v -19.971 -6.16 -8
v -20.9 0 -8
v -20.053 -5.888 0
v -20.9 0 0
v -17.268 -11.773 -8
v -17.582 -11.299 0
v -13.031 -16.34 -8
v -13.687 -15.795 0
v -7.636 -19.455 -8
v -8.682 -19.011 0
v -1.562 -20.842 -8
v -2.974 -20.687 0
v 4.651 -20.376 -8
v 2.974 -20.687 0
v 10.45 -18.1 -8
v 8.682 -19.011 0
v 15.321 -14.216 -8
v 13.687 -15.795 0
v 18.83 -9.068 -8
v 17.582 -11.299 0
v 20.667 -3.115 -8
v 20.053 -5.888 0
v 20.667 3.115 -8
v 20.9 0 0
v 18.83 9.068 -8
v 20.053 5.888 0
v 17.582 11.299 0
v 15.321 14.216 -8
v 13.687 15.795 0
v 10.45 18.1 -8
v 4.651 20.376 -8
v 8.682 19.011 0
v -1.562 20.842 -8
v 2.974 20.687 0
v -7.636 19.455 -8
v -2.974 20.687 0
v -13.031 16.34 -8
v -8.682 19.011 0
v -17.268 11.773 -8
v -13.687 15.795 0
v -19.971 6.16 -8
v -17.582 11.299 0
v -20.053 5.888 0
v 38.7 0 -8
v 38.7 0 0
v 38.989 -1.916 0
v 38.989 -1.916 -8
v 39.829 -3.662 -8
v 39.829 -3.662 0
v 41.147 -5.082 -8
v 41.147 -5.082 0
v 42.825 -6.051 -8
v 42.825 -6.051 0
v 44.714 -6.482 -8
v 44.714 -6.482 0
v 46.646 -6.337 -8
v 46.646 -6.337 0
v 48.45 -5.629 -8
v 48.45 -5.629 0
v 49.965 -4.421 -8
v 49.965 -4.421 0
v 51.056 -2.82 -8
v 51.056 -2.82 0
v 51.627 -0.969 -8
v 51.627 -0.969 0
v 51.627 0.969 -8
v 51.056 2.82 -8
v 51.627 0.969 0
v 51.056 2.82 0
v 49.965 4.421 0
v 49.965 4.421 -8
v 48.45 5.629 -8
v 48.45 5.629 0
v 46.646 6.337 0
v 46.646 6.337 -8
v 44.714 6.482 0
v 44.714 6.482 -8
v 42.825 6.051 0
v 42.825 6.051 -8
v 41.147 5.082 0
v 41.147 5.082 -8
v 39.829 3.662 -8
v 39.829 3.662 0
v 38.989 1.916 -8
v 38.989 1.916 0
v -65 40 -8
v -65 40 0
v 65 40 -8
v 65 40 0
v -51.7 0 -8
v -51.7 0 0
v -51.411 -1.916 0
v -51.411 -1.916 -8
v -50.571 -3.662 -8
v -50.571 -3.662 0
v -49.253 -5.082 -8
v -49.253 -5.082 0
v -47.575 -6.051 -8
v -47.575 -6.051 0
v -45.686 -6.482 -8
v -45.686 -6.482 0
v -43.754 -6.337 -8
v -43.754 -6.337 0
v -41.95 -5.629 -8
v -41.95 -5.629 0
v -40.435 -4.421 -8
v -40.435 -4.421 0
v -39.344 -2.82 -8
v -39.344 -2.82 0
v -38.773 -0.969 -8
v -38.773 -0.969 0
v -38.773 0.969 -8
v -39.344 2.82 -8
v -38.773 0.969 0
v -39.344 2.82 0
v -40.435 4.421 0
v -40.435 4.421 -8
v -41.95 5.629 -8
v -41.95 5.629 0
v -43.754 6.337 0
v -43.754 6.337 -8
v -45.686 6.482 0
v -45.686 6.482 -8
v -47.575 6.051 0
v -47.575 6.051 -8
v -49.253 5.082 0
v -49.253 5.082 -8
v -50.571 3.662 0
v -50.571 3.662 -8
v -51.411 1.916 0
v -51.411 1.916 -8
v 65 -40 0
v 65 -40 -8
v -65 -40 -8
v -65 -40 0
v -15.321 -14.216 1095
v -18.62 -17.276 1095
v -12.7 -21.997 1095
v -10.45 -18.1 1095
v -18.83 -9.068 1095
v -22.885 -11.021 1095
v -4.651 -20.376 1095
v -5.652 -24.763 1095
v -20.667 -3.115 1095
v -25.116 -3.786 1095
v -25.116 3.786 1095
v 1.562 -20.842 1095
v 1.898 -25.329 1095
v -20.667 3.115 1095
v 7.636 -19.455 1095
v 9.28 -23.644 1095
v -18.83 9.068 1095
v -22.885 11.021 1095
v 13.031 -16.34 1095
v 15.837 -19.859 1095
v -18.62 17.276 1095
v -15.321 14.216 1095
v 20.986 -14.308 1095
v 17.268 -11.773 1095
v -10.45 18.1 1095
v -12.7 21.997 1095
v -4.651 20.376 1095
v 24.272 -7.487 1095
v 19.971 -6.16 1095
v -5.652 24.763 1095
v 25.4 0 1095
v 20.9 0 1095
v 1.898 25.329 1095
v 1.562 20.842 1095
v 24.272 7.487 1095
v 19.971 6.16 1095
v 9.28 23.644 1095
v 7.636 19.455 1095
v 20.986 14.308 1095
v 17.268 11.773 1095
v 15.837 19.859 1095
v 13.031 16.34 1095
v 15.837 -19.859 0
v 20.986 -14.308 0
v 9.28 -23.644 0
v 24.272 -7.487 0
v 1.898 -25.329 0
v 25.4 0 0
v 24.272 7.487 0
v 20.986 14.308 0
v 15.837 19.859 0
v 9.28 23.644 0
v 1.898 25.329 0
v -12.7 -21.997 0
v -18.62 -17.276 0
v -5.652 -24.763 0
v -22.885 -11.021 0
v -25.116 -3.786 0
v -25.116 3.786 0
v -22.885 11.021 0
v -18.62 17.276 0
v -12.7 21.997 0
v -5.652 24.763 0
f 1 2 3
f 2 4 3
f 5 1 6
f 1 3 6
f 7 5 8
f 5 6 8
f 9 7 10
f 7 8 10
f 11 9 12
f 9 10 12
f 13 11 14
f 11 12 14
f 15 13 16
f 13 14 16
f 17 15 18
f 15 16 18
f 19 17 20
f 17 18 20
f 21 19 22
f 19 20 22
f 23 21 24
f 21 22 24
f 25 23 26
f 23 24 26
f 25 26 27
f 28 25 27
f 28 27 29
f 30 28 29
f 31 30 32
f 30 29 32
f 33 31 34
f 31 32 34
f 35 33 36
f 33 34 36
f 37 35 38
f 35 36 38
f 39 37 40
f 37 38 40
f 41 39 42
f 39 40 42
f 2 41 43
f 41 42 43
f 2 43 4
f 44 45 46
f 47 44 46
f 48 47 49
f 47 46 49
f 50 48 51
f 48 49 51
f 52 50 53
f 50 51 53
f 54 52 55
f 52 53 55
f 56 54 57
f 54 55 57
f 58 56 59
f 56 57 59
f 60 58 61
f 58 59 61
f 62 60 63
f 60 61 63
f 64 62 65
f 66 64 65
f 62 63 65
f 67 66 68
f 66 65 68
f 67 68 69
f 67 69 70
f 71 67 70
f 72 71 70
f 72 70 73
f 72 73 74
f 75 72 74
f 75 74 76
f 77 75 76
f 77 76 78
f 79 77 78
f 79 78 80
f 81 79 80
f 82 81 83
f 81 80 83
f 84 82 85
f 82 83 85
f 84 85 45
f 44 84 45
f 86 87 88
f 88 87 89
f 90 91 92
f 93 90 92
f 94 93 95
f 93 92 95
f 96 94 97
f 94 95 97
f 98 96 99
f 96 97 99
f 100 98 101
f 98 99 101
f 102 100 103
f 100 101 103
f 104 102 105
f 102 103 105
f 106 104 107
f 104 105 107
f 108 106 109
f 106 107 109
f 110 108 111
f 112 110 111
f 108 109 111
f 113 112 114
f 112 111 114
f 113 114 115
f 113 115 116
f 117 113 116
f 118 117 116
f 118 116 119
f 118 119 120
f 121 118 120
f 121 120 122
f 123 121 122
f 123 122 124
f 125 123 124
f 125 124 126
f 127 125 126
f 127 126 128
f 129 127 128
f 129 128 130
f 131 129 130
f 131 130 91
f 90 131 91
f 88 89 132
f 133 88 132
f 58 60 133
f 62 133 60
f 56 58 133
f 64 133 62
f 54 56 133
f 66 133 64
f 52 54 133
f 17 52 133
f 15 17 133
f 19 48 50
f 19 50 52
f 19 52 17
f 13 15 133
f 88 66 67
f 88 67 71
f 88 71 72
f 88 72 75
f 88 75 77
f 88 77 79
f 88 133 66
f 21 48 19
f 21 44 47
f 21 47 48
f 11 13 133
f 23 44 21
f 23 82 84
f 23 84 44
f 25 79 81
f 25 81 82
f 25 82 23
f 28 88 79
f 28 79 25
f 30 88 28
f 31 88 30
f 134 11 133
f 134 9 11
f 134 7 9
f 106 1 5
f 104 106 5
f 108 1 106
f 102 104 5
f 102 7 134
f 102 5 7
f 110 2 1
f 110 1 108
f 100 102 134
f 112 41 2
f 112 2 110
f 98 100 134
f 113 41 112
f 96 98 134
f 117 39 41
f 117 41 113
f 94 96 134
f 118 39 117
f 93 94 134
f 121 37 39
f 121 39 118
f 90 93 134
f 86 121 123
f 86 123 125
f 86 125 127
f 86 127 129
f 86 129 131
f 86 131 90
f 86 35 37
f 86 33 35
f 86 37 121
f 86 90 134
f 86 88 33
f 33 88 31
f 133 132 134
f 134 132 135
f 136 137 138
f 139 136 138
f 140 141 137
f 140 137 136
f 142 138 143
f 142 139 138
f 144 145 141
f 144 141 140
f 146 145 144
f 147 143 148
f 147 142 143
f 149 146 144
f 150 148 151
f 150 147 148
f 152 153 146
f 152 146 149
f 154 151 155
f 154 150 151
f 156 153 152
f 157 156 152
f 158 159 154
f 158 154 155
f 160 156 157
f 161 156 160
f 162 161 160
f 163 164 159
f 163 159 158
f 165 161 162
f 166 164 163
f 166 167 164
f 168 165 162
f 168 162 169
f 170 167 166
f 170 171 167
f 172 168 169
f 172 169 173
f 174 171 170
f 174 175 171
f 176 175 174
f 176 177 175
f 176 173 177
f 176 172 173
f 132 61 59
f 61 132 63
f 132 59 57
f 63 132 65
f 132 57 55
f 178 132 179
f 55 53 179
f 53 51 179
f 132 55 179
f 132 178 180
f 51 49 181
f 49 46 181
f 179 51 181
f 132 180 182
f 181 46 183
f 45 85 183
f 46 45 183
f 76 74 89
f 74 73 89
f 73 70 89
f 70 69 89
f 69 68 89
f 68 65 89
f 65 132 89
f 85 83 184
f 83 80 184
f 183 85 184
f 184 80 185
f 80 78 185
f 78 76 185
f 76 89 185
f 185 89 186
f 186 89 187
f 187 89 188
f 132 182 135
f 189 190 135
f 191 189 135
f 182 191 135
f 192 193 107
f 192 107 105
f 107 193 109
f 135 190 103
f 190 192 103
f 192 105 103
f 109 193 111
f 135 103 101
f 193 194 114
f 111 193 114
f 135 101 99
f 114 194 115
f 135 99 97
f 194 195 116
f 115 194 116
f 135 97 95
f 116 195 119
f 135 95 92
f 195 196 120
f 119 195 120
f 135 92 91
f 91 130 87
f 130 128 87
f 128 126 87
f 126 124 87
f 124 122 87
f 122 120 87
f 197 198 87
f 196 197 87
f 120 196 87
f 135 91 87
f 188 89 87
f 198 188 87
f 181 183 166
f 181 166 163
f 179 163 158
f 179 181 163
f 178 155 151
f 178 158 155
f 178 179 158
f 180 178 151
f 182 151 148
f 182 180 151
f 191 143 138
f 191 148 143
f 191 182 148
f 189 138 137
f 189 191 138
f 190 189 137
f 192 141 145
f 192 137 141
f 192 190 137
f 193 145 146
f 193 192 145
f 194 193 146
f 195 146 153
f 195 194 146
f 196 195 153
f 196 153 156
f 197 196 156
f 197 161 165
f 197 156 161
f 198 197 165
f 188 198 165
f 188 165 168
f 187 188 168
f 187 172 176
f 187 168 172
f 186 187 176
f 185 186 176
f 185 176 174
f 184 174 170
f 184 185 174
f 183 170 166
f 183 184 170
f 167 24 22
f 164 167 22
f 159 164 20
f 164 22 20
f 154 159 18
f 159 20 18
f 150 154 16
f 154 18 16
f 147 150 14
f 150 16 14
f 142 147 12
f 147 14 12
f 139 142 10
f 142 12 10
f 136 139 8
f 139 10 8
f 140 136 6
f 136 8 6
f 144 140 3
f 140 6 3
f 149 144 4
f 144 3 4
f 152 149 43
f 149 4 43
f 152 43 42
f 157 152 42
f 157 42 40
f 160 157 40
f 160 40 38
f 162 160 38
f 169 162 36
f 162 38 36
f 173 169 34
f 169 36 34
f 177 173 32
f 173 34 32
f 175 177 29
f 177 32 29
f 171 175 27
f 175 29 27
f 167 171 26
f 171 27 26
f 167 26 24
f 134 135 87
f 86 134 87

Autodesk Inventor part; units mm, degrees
ref_plane "YZ Plane" through (0, 0, 0) normal (1, 0, 0) x (0, 1, 0)
ref_plane "XZ Plane" through (0, 0, 0) normal (0, 1, 0) x (-1, 0, 0)
ref_plane "XY Plane" through (0, 0, 0) normal (0, 0, 1) x (1, 0, 0)
sketch "Boceto1" plane through (0, 0, 0) normal (0, 0, 1) x (1, 0, 0)
  circle A0 centre (0, 0) radius 25.4
  circle A1 centre (0, 0) radius 20.9
  dimension "d0" = 50.8
  dimension "d1" = 41.8
extrude "Extrusión1" add sketch "Boceto1" along normal blind 1095
sketch "Boceto2" plane through (0, 0, 0) normal (0, 0, -1) x (-1, 0, 0)
  line L0 (-65, -40) -> (65, -40)
  line L1 (65, -40) -> (65, 40)
  line L2 (65, 40) -> (-65, 40)
  line L3 (-65, 40) -> (-65, -40)
  line L4 (-65, -40) -> (65, 40) construction
  line L5 (65, -40) -> (-65, 40) construction
  line L6 (-65, 0) -> (-25.4, 0)
  circle A0 centre (0, 0) radius 25.4 projected
  circle A1 centre (-45.2, 0) radius 6.5
  line L7 (25.4, 0) -> (65, 0)
  circle A2 centre (45.2, 0) radius 6.5
  circle A3 centre (0, 0) radius 25.4 projected
  circle A4 centre (0, 0) radius 20.9 projected
  dimension "d4" = 130
  dimension "d5" = 80
  dimension "d6" = 13
  dimension "d7" = 13
extrude "Extrusión2" add sketch "Boceto2" along normal blind 8 contours L3 L6 A1 A0 L7 A2 L1 L0 | L3 L2 L1 L7 A2 A0 L6 A1 | A0
properties part number "tubo_principal"
